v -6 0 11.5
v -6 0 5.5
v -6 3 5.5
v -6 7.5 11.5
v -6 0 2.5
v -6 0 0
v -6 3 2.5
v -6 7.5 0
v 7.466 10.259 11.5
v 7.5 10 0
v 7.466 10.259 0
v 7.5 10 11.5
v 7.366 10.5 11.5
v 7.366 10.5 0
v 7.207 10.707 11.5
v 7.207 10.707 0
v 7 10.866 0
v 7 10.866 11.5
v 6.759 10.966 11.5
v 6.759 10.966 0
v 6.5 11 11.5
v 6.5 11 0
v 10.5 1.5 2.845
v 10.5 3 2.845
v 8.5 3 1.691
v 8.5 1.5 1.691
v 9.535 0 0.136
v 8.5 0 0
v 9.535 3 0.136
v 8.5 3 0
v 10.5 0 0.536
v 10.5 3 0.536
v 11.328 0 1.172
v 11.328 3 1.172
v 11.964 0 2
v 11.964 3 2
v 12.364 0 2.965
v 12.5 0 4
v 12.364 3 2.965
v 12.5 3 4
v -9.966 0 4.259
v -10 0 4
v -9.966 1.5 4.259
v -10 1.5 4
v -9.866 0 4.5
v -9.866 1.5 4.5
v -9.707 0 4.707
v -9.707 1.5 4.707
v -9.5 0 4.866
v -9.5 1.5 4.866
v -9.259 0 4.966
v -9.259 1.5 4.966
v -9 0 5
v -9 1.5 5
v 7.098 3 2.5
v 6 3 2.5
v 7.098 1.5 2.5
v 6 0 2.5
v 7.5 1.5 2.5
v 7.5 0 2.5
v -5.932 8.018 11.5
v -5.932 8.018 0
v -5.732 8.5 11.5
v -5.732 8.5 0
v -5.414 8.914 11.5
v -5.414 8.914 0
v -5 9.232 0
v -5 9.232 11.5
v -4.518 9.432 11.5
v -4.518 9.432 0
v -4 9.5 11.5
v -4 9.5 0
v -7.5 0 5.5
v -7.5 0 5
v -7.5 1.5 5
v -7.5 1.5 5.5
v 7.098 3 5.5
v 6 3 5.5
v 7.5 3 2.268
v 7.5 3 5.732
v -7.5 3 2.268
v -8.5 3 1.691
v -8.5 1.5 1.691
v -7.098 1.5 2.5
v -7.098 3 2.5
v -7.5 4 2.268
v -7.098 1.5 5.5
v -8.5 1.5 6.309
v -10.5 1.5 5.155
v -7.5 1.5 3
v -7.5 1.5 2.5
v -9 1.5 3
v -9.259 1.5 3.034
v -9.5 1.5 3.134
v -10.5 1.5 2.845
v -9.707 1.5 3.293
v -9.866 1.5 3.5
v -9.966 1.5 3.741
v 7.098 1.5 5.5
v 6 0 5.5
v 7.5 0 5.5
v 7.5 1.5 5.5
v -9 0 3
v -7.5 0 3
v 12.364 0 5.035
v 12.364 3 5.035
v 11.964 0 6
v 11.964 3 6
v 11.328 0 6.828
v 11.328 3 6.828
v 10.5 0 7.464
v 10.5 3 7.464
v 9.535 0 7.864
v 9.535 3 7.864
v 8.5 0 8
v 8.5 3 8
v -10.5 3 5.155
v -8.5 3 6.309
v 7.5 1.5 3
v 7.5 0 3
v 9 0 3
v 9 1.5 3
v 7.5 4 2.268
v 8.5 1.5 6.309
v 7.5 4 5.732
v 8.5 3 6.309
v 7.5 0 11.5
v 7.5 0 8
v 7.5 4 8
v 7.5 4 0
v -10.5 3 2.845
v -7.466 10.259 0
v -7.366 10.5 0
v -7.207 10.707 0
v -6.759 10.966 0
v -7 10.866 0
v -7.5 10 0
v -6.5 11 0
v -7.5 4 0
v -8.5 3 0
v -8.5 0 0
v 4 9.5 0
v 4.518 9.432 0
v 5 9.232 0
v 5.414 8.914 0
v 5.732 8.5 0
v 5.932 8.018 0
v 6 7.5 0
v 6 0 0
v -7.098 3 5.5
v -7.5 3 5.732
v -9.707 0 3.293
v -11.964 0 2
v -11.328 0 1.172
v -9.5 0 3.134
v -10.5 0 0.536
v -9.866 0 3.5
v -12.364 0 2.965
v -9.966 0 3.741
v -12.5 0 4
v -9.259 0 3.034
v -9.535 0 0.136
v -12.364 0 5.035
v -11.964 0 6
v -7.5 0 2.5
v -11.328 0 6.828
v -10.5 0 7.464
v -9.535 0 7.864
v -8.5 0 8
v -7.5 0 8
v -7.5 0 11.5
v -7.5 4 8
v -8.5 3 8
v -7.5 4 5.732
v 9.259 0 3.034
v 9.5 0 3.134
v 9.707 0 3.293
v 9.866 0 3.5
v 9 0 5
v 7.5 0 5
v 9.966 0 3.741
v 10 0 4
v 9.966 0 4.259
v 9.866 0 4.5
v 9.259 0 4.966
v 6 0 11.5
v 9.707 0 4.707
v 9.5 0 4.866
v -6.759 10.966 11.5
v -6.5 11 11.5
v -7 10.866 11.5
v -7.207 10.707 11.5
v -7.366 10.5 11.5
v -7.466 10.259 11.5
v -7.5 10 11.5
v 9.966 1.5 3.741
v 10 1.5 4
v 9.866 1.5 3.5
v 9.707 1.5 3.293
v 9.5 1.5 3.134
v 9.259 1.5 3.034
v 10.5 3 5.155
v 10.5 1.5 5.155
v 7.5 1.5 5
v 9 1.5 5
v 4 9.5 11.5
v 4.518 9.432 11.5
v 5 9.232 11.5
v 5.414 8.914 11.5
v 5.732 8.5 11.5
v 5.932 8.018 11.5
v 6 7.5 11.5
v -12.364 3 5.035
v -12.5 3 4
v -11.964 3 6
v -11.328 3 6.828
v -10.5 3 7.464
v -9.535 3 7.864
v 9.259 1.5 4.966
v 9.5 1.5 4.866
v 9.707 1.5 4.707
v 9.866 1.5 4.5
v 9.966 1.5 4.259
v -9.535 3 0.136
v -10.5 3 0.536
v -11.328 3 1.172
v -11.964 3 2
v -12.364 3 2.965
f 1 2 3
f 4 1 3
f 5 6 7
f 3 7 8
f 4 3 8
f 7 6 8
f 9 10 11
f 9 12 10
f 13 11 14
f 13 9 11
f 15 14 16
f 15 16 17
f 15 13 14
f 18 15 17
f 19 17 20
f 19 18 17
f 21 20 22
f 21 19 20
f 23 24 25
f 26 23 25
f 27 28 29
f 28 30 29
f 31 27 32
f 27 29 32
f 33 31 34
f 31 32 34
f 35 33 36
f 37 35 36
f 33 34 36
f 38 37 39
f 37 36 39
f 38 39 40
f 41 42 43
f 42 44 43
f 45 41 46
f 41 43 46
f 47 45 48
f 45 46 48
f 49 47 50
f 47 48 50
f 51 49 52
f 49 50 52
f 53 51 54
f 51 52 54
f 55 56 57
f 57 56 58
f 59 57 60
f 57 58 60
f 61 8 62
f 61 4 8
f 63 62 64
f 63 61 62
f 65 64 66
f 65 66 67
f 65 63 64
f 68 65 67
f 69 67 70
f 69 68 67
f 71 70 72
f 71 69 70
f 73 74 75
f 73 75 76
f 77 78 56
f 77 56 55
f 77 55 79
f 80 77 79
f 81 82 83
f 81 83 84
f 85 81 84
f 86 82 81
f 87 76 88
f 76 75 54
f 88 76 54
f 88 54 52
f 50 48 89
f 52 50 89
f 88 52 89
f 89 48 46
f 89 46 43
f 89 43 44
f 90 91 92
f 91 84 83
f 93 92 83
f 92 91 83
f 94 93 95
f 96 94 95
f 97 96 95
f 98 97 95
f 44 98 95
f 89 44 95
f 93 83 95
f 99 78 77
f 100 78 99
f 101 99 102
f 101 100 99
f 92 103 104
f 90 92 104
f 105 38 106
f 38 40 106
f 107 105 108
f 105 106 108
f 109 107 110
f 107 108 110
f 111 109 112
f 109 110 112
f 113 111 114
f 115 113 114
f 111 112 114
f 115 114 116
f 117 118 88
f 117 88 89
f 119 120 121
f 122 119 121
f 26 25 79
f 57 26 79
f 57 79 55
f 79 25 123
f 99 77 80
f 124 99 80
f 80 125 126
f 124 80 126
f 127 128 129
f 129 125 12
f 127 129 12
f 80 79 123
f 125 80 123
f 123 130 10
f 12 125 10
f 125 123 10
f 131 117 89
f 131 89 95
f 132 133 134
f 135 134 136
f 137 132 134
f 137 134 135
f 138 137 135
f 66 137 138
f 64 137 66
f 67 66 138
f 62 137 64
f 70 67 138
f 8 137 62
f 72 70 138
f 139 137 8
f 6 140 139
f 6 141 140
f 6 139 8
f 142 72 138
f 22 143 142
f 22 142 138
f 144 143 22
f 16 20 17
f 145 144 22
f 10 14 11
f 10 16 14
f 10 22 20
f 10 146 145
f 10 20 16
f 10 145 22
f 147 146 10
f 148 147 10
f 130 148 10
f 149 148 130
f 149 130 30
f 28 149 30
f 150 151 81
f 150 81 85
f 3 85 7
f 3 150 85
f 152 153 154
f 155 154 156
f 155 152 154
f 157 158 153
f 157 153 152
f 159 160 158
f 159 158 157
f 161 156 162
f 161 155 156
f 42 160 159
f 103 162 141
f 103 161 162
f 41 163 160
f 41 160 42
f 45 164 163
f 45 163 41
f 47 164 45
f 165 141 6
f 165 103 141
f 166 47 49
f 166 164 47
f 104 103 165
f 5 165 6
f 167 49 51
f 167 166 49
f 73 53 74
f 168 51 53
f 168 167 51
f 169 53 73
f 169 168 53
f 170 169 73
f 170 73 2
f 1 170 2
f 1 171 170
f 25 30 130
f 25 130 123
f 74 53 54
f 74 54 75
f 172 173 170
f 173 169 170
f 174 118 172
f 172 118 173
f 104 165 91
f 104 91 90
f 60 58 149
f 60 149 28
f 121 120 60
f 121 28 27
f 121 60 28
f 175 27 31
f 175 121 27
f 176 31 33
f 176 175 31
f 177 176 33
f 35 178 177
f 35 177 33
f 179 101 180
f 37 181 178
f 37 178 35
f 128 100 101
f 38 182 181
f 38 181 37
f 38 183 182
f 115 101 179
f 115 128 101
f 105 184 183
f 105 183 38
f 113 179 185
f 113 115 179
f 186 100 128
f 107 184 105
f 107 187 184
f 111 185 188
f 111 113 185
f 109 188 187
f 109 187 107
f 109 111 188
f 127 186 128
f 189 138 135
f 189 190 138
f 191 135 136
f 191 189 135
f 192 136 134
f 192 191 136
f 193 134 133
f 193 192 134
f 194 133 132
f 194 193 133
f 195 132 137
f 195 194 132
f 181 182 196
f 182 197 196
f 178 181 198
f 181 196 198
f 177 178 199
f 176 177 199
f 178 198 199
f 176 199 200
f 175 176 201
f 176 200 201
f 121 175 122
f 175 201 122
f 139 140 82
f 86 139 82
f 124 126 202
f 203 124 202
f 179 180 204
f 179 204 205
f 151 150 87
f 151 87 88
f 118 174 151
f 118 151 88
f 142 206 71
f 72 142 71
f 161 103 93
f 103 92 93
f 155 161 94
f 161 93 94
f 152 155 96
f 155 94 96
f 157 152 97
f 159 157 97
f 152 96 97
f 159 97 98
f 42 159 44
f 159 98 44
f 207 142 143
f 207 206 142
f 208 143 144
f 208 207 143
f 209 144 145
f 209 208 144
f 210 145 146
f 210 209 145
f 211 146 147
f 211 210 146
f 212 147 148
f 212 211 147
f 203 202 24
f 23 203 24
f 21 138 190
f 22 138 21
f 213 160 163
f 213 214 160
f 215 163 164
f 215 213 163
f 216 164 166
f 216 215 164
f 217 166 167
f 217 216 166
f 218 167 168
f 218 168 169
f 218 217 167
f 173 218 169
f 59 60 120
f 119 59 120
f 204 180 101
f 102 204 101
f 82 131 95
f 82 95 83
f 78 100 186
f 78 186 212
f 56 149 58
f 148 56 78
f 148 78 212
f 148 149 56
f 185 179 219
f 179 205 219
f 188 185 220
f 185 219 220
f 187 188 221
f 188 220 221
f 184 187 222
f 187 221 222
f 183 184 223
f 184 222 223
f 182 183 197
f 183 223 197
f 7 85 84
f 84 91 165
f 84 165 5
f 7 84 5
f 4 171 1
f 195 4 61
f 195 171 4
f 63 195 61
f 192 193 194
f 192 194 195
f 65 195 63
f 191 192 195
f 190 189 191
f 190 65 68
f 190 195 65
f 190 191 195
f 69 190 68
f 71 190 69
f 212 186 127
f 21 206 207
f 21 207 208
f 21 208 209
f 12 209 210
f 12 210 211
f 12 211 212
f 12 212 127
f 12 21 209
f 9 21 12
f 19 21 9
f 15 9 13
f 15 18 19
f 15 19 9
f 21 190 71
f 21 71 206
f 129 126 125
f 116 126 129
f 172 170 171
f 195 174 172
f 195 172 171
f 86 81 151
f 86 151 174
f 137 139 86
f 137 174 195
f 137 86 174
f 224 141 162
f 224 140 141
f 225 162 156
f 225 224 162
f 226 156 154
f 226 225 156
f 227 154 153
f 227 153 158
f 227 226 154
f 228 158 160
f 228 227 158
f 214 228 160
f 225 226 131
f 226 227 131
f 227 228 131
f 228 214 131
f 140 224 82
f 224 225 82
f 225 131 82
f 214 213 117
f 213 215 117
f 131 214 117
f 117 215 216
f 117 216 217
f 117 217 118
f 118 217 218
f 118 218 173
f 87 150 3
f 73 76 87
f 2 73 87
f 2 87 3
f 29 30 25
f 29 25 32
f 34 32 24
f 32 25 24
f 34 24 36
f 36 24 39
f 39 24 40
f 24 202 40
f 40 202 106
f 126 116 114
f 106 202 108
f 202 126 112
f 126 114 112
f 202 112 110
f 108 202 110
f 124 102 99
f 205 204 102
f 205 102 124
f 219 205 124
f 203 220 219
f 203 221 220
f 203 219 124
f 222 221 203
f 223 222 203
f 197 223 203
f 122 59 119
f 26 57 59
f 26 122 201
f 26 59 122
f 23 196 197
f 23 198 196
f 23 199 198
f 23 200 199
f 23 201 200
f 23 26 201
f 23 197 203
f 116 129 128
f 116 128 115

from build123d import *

# Parameters (mm, degrees)
SKETCH_1_W          = 15
SKETCH_1_H          = 11
EXTRUDE_1_DEPTH     = 11.5
SKETCH_2_W          = 5
SKETCH_2_H          = 8
EXTRUDE_2_DEPTH     = 3
SKETCH_3_W          = 12
SKETCH_3_H          = 9.5
CUT_EXTRUDE_1_DEPTH = 21.236106345
CUT_EXTRUDE_2_DEPTH = 1.5
SKETCH_5_W          = 1.5
SKETCH_5_H          = 3
CUT_EXTRUDE_3_DEPTH = 3
SKETCH_6_W          = 2.5
SKETCH_6_H          = 2
CUT_EXTRUDE_4_DEPTH = 1.5
FILLET_1_R          = 2
FILLET_2_R          = 4
FILLET_3_R          = 1
CHAMFER_1_SIZE      = 1
FILLET_4_R          = 1


with BuildPart() as part:
    # 草图1 → 凸台-拉伸1 (new body)
    with BuildSketch(Plane.XY):
        with Locations((0, 5.5)):
            Rectangle(SKETCH_1_W, SKETCH_1_H)
    extrude(amount=EXTRUDE_1_DEPTH)

    # 草图2 → 凸台-拉伸2 (add)
    with BuildSketch(Plane.XZ):
        with Locations((-10, 4)):
            Rectangle(SKETCH_2_W, SKETCH_2_H)
        with Locations((10, 4)):
            Rectangle(SKETCH_2_W, SKETCH_2_H)
    extrude(amount=-EXTRUDE_2_DEPTH)

    # 草图3 → 切除-拉伸1 (cut, through all)
    with BuildSketch(Plane(origin=(0, 0, 0), x_dir=(-1, 0, 0), z_dir=(0, 0, -1))):
        with Locations((0, 4.75)):
            Rectangle(SKETCH_3_W, SKETCH_3_H)
    extrude(amount=-CUT_EXTRUDE_1_DEPTH, mode=Mode.SUBTRACT)

    # 草图4 → 切除-拉伸2 (cut)
    with BuildSketch(Plane(origin=(0, 3, 0), x_dir=(1, 0, 0), z_dir=(0, 1, 0))):
        Polygon((8.5, -1.690598923), (6.5, -2.845299462), (6.5, -5.154700538), (8.5, -6.309401077), (10.5, -5.154700538), (10.5, -2.845299462), align=None)
        Polygon((-10.5, -2.845299462), (-8.5, -1.690598923), (-6.5, -2.845299462), (-6.5, -5.154700538), (-8.5, -6.309401077), (-10.5, -5.154700538), align=None)
    extrude(amount=-CUT_EXTRUDE_2_DEPTH, mode=Mode.SUBTRACT)

    # 草图5 → 切除-拉伸3 (cut)
    with BuildSketch(Plane.XZ):
        with Locations((6.75, 4)):
            Rectangle(SKETCH_5_W, SKETCH_5_H)
        with Locations((-6.75, 4)):
            Rectangle(SKETCH_5_W, SKETCH_5_H)
    extrude(amount=-CUT_EXTRUDE_3_DEPTH, mode=Mode.SUBTRACT)

    # 草图6 → 切除-拉伸4 (cut)
    with BuildSketch(Plane.XZ):
        with Locations((8.75, 4)):
            Rectangle(SKETCH_6_W, SKETCH_6_H)
        with Locations((-8.75, 4)):
            Rectangle(SKETCH_6_W, SKETCH_6_H)
    extrude(amount=-CUT_EXTRUDE_4_DEPTH, mode=Mode.SUBTRACT)

    # 圆角1
    fillet_1_edges = [part.edges().sort_by_distance(p)[0] for p in [
        (6, 9.5, 5.75),
        (-6, 9.5, 5.75),
    ]]
    fillet(fillet_1_edges, radius=FILLET_1_R)

    # 圆角2
    fillet_2_edges = [part.edges().sort_by_distance(p)[0] for p in [
        (12.5, 1.5, 0),
        (12.5, 1.5, 8),
        (-12.5, 1.5, 0),
        (-12.5, 1.5, 8),
    ]]
    fillet(fillet_2_edges, radius=FILLET_2_R - 0.0001)  # a hair under: the kernel refuses the full size

    # 圆角3
    fillet_3_edges = [part.edges().sort_by_distance(p)[0] for p in [
        (10, 0.75, 5),
        (10, 0.75, 3),
        (-10, 0.75, 3),
        (-10, 0.75, 5),
    ]]
    fillet(fillet_3_edges, radius=FILLET_3_R - 0.0001)  # a hair under: the kernel refuses the full size

    # 倒角1
    chamfer_1_edges = [part.edges().sort_by_distance(p)[0] for p in [
        (7.5, 3, 6.866025404),
        (7.5, 3, 1.133974596),
        (-7.5, 3, 6.866025404),
        (-7.5, 3, 1.133974596),
    ]]
    chamfer(chamfer_1_edges, length=CHAMFER_1_SIZE)

    # 圆角4
    fillet_4_edges = [part.edges().sort_by_distance(p)[0] for p in [
        (-7.5, 11, 5.75),
        (7.5, 11, 5.75),
    ]]
    fillet(fillet_4_edges, radius=FILLET_4_R)


solid = part.part
